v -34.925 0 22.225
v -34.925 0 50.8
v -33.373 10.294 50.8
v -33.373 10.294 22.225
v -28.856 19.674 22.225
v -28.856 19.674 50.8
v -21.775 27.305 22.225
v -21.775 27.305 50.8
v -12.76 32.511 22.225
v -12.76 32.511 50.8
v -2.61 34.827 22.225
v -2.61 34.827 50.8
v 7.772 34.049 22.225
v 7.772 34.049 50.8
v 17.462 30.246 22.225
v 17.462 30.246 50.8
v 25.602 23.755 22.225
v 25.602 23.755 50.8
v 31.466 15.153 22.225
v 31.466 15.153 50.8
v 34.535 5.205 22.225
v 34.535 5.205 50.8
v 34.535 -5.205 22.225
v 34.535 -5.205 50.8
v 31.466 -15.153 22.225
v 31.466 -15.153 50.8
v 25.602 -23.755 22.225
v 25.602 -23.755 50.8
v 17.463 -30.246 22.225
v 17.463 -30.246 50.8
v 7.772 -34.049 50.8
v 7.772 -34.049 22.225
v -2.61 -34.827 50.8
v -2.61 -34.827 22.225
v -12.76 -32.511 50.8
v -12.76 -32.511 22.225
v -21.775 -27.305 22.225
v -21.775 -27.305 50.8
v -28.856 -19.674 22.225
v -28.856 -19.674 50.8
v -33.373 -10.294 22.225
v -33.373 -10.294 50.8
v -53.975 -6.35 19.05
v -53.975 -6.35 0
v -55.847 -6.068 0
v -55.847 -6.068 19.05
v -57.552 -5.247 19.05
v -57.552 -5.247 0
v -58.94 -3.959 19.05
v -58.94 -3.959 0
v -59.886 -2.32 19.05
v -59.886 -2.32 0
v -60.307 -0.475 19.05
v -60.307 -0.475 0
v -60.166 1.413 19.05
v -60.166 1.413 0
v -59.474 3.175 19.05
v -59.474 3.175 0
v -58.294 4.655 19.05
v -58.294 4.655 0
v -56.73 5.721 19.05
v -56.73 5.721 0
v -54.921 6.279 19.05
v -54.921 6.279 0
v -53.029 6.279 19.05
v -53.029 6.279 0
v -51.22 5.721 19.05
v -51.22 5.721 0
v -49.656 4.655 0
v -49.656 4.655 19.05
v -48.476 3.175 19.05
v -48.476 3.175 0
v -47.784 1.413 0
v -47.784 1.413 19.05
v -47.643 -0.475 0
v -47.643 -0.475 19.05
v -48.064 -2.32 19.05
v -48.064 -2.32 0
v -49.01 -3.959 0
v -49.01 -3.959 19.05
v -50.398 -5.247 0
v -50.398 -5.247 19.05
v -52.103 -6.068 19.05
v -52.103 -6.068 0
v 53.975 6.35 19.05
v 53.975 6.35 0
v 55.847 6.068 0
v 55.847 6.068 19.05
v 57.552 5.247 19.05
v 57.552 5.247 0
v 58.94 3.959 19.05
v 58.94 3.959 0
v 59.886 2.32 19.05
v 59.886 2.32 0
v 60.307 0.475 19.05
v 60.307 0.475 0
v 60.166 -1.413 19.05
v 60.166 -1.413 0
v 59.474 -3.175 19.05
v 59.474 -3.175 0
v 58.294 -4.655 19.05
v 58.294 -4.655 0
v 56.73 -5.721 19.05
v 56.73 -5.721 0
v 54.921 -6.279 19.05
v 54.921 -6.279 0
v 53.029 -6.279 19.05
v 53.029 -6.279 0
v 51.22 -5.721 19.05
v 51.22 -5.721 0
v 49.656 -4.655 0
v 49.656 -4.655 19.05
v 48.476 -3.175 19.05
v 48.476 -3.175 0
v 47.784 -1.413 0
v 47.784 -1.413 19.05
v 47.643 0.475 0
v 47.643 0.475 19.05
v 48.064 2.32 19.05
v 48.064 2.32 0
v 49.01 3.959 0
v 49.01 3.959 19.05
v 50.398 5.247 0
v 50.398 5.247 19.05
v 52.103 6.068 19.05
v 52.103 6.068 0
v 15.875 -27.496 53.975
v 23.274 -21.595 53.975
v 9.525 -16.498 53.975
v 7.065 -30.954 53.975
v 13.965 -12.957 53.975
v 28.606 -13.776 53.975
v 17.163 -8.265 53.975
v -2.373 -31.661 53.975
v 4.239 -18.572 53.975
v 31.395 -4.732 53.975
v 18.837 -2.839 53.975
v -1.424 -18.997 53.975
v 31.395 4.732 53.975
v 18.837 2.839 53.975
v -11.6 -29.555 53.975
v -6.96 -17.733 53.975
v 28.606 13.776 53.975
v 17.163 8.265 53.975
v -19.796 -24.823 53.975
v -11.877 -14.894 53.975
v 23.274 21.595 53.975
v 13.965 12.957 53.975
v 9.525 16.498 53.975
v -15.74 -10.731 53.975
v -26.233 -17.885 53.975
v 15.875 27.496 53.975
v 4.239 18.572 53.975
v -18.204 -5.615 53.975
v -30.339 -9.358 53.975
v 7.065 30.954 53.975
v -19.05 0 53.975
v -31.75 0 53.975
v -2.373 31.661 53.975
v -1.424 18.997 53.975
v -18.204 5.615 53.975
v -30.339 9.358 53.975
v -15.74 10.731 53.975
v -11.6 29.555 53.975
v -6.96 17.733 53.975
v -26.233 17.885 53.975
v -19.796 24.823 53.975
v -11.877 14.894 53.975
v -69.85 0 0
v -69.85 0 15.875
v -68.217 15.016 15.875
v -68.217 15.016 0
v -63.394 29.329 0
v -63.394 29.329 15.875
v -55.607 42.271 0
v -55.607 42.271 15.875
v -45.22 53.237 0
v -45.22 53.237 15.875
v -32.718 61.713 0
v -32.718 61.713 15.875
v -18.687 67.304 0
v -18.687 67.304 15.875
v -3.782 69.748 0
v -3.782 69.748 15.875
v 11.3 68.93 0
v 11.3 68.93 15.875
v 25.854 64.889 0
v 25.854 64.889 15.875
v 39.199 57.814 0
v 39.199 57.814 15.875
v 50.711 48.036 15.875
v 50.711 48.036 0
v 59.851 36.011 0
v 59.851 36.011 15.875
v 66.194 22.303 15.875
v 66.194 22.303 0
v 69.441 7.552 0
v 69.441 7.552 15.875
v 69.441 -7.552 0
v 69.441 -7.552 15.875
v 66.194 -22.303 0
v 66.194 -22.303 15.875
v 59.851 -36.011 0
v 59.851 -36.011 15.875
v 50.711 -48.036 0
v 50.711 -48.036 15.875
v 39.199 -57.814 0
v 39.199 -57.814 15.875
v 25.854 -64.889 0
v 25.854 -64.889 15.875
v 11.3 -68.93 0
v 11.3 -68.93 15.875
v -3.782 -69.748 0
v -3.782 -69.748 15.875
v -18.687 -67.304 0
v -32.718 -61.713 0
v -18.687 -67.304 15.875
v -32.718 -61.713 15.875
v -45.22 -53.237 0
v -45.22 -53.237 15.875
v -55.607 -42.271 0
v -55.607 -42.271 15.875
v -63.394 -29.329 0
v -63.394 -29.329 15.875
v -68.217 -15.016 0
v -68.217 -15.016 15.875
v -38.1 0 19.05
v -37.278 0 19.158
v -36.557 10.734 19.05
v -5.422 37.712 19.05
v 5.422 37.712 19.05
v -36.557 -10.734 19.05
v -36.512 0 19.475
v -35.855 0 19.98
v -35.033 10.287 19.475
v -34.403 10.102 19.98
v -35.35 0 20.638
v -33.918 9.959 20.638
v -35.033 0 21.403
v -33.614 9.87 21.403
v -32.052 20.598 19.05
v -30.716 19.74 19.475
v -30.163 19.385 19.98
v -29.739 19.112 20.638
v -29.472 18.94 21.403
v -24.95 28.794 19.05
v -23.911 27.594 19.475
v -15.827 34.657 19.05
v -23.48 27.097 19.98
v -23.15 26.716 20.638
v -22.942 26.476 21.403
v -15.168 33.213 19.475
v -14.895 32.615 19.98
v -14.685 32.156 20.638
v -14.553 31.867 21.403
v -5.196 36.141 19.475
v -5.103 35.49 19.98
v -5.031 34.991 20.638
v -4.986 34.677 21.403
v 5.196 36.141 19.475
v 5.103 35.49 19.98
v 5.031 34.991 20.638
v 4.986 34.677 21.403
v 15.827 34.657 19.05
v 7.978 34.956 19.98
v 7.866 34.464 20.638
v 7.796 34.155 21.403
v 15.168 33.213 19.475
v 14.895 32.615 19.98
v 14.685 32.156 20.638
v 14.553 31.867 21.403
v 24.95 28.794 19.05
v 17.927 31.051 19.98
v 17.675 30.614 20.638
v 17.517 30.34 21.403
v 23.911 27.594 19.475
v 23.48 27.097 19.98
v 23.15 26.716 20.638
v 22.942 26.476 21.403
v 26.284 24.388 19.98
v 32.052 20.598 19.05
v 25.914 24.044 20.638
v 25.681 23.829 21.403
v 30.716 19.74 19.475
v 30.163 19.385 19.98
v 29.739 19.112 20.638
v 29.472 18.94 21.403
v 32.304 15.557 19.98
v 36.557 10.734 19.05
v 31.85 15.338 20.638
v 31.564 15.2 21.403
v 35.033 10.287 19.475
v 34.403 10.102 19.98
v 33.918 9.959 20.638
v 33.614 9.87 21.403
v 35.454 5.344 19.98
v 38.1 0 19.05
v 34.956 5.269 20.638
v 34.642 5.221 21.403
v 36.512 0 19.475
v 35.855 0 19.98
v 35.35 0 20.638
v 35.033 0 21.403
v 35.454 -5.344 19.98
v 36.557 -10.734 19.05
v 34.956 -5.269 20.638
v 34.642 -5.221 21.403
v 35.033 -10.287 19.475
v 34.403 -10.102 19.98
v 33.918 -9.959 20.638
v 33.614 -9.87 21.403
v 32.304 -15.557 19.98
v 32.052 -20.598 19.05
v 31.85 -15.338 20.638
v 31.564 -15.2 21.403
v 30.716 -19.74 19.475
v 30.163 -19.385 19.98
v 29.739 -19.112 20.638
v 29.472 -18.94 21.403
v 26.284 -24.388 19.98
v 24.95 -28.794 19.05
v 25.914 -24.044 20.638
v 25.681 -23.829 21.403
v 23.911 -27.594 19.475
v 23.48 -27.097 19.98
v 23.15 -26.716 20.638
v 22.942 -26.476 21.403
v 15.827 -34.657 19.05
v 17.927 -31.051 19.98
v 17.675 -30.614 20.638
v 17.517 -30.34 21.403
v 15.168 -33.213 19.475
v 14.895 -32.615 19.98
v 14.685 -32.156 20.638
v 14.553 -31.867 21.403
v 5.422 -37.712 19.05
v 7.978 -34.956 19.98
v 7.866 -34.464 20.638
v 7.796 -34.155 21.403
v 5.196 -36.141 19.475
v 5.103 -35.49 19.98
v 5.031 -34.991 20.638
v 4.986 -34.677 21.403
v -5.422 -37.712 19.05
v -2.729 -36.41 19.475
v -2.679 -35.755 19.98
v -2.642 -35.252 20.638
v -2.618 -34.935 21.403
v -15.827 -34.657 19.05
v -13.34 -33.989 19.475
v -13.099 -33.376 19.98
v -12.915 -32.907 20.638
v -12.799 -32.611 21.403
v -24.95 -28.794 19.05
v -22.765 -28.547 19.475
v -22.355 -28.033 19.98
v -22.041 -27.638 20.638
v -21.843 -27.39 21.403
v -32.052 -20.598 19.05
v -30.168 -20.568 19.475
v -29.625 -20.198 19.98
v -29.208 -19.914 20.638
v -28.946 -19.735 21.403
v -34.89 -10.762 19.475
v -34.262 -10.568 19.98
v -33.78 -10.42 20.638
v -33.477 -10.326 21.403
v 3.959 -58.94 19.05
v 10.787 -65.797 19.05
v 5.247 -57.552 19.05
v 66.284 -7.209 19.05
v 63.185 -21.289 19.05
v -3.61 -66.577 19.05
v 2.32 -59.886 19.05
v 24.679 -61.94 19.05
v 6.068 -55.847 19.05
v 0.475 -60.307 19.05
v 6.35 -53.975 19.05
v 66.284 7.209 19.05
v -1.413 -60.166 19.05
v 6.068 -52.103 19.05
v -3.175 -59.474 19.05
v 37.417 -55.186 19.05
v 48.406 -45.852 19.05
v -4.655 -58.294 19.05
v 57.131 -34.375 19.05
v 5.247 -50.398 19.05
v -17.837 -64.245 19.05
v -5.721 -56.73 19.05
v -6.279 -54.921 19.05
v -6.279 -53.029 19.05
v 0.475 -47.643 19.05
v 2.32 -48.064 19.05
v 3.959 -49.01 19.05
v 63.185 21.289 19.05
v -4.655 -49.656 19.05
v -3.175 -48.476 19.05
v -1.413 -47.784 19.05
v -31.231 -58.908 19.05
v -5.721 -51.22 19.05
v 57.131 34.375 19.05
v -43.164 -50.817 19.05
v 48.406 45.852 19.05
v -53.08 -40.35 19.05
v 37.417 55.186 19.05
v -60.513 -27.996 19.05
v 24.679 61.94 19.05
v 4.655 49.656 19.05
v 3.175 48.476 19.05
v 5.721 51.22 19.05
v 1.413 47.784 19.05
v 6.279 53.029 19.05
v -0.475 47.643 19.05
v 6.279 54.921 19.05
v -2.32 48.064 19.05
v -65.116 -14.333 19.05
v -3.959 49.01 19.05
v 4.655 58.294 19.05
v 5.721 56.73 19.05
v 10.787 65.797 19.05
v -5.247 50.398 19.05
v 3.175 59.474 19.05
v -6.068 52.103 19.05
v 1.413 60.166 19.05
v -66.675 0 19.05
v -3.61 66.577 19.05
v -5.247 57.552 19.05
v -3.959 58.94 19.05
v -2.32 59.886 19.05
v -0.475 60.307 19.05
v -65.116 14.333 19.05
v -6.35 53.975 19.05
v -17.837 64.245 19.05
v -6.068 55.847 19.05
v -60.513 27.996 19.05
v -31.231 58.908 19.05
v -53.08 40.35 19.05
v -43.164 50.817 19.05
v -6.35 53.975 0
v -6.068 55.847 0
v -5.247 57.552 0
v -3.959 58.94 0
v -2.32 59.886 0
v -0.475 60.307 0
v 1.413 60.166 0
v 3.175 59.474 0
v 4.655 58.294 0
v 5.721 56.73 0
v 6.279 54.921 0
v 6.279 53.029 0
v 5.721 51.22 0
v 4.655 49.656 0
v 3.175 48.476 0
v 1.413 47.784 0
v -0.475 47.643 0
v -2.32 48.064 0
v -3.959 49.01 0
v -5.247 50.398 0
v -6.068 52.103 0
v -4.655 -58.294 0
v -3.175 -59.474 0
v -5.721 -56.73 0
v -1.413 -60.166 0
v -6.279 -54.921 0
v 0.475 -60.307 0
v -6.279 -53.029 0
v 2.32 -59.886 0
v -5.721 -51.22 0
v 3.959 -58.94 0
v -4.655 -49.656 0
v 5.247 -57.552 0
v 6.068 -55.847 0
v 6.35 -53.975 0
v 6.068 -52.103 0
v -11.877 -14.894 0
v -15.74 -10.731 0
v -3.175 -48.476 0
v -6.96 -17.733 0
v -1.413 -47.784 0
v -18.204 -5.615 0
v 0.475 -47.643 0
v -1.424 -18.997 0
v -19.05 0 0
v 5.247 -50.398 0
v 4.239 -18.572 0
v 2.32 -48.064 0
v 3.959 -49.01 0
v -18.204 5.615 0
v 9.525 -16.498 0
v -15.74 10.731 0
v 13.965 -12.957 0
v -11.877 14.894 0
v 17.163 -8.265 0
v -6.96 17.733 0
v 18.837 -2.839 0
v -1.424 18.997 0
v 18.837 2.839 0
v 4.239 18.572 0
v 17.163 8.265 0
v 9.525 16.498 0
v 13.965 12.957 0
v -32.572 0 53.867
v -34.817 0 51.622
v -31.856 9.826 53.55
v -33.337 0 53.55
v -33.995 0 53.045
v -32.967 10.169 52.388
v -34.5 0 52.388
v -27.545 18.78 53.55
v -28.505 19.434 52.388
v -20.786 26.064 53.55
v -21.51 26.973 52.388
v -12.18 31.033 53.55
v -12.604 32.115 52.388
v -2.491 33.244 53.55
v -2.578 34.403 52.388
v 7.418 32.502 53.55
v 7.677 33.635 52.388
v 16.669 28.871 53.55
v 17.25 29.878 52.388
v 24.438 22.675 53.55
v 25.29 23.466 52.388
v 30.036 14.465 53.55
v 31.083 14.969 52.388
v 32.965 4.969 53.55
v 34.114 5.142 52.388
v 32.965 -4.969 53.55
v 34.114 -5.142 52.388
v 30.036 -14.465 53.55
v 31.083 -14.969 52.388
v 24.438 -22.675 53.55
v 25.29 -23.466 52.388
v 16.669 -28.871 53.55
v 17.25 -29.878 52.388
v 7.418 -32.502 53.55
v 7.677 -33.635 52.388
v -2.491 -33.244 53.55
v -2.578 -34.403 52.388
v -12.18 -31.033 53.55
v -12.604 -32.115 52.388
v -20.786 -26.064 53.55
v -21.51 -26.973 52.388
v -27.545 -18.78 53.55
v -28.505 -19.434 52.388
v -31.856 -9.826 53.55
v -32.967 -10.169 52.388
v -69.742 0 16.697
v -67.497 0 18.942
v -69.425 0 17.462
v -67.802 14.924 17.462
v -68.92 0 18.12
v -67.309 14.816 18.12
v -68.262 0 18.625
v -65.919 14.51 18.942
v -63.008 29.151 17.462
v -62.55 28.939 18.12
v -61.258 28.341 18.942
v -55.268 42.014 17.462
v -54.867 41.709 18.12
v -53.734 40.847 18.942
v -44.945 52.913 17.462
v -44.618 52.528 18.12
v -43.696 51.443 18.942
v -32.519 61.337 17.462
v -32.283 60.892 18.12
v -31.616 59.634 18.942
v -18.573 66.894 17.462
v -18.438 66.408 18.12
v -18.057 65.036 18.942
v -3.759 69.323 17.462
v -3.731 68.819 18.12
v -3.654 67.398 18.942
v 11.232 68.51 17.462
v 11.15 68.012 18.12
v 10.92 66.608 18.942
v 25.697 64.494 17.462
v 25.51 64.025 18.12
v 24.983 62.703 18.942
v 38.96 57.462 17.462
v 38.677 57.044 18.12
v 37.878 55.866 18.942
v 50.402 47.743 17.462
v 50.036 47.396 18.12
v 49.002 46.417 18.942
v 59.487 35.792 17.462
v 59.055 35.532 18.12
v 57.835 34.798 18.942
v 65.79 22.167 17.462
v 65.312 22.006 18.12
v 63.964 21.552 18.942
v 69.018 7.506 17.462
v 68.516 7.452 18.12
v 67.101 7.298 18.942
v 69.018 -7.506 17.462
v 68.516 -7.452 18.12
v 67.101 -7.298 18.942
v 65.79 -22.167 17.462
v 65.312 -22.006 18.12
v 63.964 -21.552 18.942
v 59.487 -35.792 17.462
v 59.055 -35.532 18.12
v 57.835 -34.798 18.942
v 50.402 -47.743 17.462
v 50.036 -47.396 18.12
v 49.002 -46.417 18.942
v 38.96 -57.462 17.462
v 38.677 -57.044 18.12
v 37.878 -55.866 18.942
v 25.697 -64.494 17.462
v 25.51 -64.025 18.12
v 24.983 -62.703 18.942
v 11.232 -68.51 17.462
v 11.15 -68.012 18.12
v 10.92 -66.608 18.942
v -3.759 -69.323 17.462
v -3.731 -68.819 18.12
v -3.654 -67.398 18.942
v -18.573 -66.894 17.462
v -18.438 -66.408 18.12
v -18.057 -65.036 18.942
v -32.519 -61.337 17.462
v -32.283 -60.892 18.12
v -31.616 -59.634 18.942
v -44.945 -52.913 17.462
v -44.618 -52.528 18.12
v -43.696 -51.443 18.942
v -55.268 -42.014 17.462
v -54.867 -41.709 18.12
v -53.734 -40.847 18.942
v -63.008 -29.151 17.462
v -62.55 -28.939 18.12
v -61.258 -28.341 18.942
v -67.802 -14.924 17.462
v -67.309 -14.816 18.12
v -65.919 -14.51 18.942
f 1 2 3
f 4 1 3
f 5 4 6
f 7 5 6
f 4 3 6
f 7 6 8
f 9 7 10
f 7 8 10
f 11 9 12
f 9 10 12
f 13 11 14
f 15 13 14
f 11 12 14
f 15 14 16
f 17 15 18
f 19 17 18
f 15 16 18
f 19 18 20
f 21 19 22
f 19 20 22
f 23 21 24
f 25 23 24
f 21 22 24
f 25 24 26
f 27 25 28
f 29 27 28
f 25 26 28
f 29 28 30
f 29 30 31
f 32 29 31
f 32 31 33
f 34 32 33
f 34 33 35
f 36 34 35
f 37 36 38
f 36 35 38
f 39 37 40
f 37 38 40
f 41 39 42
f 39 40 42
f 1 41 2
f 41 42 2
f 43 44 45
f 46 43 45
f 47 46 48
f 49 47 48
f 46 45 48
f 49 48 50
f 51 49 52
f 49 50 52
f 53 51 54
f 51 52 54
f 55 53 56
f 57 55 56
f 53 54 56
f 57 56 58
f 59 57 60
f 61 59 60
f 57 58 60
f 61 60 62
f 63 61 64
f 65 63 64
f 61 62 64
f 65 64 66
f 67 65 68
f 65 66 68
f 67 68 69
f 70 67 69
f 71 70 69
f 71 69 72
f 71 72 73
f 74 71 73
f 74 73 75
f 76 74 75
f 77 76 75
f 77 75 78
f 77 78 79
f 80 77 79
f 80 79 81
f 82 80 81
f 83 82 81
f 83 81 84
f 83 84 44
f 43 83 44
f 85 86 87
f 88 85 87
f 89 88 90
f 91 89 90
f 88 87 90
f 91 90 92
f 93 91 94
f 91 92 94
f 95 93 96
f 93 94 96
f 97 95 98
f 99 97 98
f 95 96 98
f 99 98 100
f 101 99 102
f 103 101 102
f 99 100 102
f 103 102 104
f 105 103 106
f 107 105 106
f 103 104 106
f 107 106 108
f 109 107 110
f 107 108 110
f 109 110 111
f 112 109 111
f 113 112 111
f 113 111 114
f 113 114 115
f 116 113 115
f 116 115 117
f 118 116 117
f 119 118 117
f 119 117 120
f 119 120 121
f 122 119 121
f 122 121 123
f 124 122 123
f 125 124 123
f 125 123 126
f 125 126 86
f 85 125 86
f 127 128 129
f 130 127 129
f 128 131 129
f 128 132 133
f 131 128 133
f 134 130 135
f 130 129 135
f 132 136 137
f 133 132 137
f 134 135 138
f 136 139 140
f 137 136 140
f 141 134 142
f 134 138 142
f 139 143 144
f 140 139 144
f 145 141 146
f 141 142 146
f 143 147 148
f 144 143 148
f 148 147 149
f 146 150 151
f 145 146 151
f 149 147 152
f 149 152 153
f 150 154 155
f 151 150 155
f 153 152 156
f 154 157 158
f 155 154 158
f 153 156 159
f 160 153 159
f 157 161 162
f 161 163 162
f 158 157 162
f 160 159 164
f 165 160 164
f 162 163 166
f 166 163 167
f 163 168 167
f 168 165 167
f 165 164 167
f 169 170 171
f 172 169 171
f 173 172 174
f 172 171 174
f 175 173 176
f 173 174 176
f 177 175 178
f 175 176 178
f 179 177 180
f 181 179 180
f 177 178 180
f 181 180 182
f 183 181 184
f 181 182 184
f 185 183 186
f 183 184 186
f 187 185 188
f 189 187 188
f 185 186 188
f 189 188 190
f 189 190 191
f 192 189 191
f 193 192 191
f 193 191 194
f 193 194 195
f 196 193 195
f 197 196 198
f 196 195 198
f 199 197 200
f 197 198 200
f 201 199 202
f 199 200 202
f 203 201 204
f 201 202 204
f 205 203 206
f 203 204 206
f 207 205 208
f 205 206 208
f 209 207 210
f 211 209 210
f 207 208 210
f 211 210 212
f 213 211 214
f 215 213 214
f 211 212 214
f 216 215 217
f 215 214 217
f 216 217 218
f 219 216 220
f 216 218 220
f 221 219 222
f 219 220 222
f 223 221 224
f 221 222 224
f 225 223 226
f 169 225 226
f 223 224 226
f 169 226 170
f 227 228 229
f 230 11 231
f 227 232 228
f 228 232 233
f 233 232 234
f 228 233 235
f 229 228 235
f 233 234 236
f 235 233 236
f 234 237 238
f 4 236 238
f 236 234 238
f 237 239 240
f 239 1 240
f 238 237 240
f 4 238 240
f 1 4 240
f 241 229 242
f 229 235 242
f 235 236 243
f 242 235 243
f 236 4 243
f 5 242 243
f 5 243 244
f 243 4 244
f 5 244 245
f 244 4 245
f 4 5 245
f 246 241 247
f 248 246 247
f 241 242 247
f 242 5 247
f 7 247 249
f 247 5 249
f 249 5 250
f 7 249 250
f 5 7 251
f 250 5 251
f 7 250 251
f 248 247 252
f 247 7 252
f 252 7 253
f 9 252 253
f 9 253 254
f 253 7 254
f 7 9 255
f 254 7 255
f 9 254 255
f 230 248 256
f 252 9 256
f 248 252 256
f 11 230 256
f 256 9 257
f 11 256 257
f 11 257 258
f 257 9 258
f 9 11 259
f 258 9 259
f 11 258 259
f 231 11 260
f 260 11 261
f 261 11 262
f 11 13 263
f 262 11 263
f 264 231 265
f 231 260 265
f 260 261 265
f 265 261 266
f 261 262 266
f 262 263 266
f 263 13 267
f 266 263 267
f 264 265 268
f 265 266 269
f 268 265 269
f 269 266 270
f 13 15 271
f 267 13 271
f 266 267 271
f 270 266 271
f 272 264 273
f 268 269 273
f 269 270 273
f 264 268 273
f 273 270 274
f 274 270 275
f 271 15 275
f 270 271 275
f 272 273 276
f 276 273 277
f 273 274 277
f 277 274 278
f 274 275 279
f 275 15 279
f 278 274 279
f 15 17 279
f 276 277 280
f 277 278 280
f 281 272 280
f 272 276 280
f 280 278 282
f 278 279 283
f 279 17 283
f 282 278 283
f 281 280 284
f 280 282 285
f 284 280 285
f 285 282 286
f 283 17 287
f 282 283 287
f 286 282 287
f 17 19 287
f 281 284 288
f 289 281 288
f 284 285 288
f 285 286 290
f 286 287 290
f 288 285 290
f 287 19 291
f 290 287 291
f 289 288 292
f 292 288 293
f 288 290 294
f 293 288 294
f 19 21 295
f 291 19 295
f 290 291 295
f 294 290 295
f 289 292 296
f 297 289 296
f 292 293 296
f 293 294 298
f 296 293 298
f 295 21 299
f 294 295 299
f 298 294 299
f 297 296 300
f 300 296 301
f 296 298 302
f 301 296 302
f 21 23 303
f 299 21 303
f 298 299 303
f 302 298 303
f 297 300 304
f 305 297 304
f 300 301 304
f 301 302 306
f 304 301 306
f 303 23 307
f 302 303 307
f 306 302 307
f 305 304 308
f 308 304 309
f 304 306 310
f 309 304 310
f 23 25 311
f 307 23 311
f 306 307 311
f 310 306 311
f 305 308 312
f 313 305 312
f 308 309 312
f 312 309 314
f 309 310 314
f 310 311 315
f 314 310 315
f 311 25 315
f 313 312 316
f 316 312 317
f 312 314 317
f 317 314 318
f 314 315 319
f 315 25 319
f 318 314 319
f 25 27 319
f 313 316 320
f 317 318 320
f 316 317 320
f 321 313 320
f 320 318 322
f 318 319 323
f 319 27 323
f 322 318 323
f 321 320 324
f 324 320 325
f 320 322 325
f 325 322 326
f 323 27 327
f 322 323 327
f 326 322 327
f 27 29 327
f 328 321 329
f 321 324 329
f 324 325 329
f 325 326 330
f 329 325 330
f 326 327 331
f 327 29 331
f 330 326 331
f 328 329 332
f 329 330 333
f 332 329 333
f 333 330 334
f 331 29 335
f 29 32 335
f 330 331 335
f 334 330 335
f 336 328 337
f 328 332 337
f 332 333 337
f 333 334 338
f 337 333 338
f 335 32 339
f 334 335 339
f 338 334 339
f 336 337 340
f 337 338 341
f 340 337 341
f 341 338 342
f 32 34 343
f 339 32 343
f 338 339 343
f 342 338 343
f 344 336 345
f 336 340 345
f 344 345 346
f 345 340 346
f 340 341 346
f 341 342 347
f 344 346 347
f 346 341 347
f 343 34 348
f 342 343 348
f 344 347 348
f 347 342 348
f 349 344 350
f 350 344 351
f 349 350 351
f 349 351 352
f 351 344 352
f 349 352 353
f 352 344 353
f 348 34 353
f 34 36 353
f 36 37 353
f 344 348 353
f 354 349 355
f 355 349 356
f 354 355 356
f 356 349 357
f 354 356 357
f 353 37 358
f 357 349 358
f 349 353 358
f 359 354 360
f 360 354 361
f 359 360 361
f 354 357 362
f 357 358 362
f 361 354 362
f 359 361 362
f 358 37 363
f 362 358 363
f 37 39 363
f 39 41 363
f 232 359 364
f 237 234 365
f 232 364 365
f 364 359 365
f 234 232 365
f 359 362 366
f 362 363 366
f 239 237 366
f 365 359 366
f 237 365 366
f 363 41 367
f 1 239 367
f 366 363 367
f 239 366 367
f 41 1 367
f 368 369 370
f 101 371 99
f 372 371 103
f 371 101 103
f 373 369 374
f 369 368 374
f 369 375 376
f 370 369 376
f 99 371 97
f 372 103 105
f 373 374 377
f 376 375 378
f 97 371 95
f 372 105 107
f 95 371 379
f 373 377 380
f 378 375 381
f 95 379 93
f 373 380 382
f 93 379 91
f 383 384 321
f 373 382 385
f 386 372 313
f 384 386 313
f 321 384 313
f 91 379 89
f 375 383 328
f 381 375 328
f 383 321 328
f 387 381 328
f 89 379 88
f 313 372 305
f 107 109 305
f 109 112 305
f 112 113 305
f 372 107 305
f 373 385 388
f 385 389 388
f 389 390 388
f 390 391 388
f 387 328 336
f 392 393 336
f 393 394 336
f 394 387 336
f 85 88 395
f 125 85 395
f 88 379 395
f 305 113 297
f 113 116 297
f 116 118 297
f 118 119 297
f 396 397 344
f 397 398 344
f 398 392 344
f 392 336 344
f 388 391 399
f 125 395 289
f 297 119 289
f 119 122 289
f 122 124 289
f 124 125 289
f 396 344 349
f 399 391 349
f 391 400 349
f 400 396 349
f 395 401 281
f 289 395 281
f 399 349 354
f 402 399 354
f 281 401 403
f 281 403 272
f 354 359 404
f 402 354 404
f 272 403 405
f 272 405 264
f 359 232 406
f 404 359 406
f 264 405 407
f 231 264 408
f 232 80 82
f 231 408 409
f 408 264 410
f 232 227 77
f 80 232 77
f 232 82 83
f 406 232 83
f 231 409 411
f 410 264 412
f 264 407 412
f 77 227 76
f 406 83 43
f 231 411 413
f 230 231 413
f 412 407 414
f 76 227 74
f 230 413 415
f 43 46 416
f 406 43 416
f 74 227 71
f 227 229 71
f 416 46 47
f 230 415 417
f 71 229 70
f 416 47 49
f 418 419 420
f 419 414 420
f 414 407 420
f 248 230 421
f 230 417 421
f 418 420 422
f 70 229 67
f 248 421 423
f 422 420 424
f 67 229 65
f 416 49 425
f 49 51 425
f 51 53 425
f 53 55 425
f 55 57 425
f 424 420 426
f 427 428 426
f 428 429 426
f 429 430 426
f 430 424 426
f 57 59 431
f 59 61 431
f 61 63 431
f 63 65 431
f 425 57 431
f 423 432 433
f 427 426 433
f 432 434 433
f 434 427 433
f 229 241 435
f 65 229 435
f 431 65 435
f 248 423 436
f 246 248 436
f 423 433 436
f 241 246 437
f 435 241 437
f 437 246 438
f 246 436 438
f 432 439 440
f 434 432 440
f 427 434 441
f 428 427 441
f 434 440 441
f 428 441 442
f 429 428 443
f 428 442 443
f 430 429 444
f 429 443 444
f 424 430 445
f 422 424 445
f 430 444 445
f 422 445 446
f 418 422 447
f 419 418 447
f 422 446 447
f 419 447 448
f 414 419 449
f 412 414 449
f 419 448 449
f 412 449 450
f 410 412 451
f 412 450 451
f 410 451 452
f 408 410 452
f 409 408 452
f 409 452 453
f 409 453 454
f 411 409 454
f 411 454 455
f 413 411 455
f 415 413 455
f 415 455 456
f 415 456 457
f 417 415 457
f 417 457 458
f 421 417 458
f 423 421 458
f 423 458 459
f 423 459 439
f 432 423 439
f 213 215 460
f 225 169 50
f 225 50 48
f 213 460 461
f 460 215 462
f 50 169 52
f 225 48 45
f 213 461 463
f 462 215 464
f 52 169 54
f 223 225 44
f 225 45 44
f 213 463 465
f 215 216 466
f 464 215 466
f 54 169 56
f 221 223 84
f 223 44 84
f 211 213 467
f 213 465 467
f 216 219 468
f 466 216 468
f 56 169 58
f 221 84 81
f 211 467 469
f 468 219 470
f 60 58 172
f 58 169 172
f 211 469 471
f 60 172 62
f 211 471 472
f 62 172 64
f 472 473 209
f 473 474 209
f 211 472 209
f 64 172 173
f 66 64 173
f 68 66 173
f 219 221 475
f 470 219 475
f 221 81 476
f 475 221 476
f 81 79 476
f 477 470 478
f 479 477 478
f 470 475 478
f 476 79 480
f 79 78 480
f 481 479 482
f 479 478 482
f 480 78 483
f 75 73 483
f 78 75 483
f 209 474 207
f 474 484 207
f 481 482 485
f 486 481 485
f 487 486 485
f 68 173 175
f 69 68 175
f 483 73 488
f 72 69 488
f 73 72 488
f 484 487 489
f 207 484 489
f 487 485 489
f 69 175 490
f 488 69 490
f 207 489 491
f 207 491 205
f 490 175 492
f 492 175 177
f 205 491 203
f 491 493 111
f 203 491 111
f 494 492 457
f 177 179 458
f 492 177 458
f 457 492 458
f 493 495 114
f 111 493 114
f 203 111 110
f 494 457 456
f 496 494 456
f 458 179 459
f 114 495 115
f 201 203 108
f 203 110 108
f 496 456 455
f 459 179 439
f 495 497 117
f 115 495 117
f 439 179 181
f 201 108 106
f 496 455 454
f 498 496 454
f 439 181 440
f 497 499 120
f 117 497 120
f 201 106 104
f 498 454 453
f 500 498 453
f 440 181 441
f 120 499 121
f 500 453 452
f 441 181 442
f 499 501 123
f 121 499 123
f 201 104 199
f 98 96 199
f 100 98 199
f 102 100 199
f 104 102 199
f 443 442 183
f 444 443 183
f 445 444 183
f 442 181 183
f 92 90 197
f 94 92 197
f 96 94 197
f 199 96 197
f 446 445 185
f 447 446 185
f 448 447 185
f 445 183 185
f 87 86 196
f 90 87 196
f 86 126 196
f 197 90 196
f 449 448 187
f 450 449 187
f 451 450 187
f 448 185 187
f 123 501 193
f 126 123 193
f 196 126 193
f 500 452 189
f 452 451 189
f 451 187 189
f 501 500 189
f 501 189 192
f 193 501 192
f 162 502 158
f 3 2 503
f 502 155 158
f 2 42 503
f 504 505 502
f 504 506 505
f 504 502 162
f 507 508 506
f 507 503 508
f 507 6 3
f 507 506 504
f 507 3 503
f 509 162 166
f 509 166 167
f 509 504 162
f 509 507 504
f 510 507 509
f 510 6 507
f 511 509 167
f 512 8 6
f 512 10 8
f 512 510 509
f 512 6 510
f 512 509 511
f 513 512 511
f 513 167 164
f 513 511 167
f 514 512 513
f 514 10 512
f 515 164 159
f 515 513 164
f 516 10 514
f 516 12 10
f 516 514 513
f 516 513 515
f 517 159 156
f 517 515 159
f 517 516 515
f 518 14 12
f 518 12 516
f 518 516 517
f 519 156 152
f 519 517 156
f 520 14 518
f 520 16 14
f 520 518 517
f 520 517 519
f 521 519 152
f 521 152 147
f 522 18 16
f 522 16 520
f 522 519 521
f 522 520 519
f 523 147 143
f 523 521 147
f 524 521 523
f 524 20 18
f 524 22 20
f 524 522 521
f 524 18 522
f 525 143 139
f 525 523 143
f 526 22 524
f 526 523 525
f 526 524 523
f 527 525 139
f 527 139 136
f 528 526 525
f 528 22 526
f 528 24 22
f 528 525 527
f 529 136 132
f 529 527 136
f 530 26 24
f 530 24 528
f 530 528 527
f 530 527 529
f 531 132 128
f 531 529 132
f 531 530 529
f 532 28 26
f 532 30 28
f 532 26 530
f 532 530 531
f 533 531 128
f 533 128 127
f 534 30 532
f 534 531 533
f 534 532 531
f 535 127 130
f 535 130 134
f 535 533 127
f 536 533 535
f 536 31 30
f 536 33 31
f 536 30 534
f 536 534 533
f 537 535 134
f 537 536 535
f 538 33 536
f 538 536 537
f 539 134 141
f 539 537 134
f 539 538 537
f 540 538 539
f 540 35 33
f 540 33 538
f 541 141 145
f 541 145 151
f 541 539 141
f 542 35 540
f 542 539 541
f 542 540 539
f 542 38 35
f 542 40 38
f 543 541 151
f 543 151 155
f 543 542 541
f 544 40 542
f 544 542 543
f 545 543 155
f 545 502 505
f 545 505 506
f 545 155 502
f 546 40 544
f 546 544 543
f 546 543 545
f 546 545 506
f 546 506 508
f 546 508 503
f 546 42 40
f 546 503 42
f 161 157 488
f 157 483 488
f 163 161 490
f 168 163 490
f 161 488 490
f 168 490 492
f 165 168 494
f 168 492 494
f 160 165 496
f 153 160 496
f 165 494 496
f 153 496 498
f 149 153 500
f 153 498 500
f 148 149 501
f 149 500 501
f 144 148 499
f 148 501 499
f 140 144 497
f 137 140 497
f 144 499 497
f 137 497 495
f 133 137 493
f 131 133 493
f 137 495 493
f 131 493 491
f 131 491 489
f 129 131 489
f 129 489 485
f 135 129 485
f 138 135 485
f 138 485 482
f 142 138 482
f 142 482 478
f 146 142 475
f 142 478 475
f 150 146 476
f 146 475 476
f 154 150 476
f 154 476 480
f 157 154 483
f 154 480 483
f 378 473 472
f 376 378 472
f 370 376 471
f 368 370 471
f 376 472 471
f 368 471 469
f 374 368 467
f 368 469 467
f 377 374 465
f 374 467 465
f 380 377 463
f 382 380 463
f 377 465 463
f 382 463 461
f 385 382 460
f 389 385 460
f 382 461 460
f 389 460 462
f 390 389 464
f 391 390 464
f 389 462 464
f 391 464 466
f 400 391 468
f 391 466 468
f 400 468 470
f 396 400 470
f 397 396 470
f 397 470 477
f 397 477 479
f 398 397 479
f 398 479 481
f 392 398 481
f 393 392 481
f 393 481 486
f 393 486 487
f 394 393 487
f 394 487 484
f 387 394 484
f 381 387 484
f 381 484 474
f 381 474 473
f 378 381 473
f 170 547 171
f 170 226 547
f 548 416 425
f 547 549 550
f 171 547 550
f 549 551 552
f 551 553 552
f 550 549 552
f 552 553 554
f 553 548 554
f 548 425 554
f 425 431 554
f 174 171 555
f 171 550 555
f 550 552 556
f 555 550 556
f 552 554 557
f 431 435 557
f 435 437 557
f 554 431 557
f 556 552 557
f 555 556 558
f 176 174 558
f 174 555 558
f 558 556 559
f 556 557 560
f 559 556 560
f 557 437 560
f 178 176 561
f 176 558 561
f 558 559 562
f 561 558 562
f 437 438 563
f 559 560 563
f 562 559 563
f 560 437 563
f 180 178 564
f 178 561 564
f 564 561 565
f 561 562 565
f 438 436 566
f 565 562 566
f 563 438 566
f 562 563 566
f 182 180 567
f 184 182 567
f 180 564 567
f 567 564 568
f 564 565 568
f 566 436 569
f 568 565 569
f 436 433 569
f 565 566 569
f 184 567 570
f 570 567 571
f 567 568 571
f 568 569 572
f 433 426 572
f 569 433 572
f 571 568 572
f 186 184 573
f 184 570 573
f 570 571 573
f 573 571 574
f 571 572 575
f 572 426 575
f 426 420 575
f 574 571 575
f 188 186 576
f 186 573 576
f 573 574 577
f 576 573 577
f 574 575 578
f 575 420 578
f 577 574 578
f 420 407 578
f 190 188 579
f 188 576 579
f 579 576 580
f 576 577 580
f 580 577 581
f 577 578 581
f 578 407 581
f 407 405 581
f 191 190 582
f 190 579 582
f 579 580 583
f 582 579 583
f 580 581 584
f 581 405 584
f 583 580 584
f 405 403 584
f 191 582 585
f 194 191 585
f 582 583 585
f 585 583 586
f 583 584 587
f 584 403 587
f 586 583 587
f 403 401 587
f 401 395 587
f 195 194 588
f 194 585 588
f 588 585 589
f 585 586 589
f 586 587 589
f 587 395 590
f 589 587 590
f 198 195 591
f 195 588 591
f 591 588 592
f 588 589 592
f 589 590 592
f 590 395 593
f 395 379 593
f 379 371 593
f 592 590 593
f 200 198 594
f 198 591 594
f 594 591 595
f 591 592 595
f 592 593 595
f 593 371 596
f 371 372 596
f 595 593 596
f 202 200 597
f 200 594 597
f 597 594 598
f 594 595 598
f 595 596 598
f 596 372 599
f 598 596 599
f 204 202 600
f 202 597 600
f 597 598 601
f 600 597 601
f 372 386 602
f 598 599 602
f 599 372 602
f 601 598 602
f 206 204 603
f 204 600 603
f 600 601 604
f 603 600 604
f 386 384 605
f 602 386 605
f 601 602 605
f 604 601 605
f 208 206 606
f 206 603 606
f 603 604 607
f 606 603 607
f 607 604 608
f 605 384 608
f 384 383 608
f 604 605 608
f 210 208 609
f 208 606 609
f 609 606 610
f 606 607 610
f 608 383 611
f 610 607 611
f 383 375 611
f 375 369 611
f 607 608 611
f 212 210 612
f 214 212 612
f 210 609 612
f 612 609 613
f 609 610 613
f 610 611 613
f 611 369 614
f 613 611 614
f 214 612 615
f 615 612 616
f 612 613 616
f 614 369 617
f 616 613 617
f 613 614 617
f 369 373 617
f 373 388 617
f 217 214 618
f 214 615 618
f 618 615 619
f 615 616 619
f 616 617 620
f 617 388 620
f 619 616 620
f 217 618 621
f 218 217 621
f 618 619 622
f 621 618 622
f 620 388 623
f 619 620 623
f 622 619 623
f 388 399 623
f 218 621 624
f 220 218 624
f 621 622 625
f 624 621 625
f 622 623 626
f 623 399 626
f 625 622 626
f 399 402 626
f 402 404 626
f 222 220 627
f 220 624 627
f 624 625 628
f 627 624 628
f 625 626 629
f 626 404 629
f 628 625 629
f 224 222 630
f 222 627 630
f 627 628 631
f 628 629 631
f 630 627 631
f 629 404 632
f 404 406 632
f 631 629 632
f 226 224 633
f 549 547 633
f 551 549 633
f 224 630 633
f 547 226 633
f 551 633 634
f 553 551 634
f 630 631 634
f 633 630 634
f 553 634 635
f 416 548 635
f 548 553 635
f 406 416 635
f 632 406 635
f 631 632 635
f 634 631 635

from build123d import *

# Parameters (mm, degrees)
D_GAGEMENT_22_D              = 12.7
R_P_TITION_CIRCULAIRE1_COUNT = 4
CONG_1_R                     = 3.175


with BuildPart() as part:
    # Esquisse1 → Base-Révolution (revolve)
    with BuildSketch(Plane(origin=(0, 0, 0), x_dir=(0, 0, -1), z_dir=(1, 0, 0)), mode=Mode.PRIVATE) as base_r_volution_sk:
        Polygon((0, 19.05), (0, 69.85), (-19.05, 69.85), (-19.05, 34.925), (-53.975, 34.925), (-53.975, 19.05), align=None)
    revolve(base_r_volution_sk.sketch.rotate(Axis((0, 0, 48.319469853), (0, 0, -1)), 270), axis=Axis((0, 0, 48.319469853), (0, 0, -1)))

    # Dégagement 22 (through all)
    with Locations(Plane.XY.offset(19.05)):
        with Locations((0, 53.975)):
            d_gagement_22 = Hole(D_GAGEMENT_22_D / 2)

    # Répétition circulaire1: Dégagement 22 ×4 about axis
    r_p_tition_circulaire1_axis = Axis((0, 0, 0), (0, 0, 1))
    for i in range(1, R_P_TITION_CIRCULAIRE1_COUNT):
        add(d_gagement_22.rotate(r_p_tition_circulaire1_axis, i * 360 / R_P_TITION_CIRCULAIRE1_COUNT), mode=Mode.SUBTRACT)

    # Congé1
    cong_1_edges = [part.edges().sort_by_distance(p)[0] for p in [
        (34.925, 0, 53.975),
        (34.925, 0, 19.05),
        (69.85, 0, 19.05),
    ]]
    fillet(cong_1_edges, radius=CONG_1_R)


solid = part.part
